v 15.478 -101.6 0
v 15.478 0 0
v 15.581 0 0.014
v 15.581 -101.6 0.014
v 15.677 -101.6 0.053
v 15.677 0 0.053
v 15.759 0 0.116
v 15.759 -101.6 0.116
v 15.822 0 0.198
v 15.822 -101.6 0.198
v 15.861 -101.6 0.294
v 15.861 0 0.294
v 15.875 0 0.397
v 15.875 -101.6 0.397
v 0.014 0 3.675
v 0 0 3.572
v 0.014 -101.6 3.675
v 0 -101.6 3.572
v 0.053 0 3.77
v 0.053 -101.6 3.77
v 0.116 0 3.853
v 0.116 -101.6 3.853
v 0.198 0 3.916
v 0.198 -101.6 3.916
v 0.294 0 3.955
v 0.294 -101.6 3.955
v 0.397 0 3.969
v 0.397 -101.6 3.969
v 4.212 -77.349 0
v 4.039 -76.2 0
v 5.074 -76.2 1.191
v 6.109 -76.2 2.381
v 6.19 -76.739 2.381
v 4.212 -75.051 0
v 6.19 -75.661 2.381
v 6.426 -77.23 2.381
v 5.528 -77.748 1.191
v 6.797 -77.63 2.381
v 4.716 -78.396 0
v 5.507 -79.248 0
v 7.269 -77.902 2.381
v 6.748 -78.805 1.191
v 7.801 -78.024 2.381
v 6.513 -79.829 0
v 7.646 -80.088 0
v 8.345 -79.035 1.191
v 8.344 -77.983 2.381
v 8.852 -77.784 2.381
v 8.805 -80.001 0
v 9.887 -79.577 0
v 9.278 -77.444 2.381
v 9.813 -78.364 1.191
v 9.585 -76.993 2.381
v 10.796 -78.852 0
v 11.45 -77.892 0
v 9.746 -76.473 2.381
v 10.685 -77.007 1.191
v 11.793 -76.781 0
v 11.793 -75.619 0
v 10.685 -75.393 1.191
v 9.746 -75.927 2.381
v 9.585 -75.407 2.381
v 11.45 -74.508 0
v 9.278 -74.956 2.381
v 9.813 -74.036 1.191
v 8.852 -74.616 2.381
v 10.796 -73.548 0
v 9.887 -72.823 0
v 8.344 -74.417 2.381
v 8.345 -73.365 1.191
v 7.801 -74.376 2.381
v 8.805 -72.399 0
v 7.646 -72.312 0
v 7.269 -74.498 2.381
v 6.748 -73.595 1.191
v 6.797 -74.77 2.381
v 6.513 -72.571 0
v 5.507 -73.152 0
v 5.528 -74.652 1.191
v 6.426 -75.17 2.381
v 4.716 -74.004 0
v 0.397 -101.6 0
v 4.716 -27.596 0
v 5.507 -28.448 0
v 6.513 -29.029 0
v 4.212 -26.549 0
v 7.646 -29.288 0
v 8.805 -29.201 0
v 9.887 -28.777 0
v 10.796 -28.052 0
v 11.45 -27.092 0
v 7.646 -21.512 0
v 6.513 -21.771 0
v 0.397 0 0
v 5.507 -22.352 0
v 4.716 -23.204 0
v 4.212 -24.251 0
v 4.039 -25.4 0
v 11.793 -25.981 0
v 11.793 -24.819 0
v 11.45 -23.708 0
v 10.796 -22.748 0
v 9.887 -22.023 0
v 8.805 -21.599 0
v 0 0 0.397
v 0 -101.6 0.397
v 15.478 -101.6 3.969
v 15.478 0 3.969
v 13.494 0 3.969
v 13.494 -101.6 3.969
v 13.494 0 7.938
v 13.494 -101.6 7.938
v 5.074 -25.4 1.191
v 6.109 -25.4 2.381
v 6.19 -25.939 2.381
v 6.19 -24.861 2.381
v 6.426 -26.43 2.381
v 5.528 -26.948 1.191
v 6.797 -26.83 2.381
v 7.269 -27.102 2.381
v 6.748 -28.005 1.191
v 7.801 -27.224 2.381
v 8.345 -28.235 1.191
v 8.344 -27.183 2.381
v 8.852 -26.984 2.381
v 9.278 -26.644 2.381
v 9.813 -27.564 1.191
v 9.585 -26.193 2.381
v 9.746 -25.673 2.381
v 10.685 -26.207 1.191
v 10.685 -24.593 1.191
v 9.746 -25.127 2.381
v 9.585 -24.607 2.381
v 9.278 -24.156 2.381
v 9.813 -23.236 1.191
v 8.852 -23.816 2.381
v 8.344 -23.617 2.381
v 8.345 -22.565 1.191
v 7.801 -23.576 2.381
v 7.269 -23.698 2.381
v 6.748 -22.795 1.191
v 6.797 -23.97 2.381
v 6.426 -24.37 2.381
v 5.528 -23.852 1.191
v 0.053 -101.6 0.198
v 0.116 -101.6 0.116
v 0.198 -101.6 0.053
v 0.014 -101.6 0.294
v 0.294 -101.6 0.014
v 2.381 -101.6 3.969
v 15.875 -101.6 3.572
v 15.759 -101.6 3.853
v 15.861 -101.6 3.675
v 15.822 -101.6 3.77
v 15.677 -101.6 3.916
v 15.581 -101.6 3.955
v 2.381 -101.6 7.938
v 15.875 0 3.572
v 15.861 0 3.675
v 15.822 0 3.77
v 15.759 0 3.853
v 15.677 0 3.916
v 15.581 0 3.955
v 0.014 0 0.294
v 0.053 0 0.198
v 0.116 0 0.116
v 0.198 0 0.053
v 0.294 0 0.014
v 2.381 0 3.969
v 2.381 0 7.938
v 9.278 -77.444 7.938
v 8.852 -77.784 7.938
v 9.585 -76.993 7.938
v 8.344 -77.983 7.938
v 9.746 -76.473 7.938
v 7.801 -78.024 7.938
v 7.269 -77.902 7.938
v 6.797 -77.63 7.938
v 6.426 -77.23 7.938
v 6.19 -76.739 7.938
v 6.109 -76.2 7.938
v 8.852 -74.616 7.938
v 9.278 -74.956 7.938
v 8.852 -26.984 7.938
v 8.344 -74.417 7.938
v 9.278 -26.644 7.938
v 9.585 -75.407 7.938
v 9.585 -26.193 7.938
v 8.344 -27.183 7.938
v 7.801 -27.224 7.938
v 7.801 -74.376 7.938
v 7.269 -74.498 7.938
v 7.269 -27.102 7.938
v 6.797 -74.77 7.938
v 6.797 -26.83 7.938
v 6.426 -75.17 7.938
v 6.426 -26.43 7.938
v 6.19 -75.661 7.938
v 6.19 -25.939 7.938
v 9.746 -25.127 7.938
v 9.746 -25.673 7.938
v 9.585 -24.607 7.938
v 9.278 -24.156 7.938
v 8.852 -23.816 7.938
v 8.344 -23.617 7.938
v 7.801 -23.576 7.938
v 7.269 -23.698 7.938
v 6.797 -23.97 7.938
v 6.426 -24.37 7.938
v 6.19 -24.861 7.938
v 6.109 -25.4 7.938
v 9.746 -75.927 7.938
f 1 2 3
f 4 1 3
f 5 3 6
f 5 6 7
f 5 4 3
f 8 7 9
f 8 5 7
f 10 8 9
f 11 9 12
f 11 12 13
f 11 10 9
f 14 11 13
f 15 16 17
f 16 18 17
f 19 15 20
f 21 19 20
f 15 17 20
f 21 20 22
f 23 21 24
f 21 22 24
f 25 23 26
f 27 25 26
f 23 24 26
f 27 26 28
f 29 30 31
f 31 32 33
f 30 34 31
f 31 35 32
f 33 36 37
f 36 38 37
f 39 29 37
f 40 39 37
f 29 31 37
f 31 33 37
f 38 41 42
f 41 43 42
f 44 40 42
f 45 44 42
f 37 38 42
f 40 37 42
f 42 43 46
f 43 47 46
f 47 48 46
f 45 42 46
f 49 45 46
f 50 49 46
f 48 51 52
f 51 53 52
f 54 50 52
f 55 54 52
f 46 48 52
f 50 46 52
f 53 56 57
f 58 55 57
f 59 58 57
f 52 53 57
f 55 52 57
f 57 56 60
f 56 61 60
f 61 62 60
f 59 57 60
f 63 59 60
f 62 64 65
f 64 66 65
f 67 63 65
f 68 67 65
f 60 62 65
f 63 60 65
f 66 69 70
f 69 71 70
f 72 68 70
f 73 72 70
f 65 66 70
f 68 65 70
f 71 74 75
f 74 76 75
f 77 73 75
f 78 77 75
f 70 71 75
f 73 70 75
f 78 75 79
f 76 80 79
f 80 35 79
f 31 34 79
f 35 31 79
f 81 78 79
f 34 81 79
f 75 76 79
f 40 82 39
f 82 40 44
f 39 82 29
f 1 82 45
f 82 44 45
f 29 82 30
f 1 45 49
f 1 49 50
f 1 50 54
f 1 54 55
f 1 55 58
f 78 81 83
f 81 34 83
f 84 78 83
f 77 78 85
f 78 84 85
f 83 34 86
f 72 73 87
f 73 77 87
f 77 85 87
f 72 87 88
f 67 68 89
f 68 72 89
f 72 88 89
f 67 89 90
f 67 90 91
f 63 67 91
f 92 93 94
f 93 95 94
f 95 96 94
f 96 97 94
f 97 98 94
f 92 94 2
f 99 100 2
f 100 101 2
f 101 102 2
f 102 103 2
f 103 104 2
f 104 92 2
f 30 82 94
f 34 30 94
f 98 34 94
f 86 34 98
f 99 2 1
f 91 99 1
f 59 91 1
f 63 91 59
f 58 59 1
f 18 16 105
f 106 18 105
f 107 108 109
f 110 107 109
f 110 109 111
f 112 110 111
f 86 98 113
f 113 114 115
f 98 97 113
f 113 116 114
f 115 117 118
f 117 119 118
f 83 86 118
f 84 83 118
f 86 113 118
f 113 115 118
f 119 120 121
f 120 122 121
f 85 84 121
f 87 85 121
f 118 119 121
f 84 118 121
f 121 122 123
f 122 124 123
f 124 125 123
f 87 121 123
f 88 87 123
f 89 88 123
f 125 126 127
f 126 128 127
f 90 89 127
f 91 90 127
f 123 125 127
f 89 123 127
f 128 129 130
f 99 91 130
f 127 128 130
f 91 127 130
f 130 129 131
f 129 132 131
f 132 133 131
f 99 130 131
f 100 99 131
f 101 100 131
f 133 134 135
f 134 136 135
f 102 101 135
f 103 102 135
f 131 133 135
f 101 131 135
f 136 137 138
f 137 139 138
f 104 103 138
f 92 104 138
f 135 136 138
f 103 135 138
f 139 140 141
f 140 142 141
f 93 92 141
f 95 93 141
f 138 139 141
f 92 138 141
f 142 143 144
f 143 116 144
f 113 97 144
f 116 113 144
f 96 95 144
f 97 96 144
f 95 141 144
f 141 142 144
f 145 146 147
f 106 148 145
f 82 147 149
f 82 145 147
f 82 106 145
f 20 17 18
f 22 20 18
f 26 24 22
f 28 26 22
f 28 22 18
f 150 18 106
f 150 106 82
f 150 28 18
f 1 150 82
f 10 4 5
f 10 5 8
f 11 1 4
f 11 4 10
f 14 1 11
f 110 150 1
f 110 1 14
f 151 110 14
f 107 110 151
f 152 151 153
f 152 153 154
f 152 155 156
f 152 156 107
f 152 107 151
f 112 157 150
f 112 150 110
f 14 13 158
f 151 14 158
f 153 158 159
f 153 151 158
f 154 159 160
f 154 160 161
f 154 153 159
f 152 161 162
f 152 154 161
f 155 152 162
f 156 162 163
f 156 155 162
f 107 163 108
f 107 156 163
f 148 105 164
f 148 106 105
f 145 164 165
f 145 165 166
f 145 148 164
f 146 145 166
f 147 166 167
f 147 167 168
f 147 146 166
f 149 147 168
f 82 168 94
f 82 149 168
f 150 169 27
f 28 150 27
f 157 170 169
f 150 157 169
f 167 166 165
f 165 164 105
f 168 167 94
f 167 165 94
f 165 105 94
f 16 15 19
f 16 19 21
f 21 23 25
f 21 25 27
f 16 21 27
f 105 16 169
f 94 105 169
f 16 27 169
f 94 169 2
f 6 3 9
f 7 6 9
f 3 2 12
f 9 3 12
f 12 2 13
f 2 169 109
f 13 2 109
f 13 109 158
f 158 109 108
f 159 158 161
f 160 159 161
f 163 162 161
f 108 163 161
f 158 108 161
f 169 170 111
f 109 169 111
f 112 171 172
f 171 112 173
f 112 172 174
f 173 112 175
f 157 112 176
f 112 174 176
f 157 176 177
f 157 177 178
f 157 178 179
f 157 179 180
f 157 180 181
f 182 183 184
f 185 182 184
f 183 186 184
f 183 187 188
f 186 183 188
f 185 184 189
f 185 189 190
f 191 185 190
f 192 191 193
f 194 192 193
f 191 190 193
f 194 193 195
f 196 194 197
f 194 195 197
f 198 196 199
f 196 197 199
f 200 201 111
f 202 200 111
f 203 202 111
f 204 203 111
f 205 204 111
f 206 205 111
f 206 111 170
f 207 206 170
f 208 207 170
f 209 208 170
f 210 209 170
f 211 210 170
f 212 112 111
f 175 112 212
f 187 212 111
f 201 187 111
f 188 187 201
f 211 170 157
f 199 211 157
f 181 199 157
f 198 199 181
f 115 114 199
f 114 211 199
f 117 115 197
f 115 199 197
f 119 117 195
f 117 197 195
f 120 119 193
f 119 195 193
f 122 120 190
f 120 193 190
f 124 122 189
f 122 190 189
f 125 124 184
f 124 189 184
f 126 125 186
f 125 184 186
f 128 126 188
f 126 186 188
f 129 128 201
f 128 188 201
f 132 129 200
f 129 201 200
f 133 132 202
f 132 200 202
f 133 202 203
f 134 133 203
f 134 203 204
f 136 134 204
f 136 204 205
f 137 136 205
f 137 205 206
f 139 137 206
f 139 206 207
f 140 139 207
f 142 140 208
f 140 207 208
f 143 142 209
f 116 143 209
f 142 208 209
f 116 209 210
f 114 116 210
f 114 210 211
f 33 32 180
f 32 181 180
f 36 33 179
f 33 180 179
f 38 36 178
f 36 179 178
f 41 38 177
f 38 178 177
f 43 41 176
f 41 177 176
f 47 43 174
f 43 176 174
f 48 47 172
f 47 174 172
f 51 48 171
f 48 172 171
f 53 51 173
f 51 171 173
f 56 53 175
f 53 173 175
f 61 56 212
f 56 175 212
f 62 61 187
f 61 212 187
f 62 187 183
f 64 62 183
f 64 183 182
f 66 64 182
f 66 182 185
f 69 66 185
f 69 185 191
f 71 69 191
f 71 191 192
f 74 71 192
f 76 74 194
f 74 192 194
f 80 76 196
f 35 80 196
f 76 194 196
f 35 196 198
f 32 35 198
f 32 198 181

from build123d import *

# Parameters (mm, degrees)
F1_DEPTH       = 101.6
F3_R           = 0.396875
F4_D           = 3.6576
F4_CSINK_D     = 7.7978
F4_CSINK_ANGLE = 82


with BuildPart() as f1:
    # F0 (on Front) → F1 (new body)
    with BuildSketch(Plane.XZ):
        Polygon((0, 3.96875), (0, 0), (15.875, 0), (15.875, 3.96875), (13.49375, 3.96875), (13.49375, 7.9375), (2.38125, 7.9375), (2.38125, 3.96875), align=None)
    extrude(amount=F1_DEPTH)

    # F3
    f3_edges = [f1.edges().sort_by_distance(p)[0] for p in [
        (15.875, -50.8, 3.96875),
        (15.875, -50.8, 0),
        (0, -50.8, 3.96875),
        (0, -50.8, 0),
    ]]
    fillet(f3_edges, radius=F3_R)

    # F4 (through all)
    with Locations(Plane(origin=(0, 0, 0), x_dir=(1, 0, 0), z_dir=(0, 0, -1))):
        with Locations((7.9375, 76.2), (7.9375, 25.4)):
            CounterSinkHole(F4_D / 2, F4_CSINK_D / 2, counter_sink_angle=F4_CSINK_ANGLE)


solid = f1.part
